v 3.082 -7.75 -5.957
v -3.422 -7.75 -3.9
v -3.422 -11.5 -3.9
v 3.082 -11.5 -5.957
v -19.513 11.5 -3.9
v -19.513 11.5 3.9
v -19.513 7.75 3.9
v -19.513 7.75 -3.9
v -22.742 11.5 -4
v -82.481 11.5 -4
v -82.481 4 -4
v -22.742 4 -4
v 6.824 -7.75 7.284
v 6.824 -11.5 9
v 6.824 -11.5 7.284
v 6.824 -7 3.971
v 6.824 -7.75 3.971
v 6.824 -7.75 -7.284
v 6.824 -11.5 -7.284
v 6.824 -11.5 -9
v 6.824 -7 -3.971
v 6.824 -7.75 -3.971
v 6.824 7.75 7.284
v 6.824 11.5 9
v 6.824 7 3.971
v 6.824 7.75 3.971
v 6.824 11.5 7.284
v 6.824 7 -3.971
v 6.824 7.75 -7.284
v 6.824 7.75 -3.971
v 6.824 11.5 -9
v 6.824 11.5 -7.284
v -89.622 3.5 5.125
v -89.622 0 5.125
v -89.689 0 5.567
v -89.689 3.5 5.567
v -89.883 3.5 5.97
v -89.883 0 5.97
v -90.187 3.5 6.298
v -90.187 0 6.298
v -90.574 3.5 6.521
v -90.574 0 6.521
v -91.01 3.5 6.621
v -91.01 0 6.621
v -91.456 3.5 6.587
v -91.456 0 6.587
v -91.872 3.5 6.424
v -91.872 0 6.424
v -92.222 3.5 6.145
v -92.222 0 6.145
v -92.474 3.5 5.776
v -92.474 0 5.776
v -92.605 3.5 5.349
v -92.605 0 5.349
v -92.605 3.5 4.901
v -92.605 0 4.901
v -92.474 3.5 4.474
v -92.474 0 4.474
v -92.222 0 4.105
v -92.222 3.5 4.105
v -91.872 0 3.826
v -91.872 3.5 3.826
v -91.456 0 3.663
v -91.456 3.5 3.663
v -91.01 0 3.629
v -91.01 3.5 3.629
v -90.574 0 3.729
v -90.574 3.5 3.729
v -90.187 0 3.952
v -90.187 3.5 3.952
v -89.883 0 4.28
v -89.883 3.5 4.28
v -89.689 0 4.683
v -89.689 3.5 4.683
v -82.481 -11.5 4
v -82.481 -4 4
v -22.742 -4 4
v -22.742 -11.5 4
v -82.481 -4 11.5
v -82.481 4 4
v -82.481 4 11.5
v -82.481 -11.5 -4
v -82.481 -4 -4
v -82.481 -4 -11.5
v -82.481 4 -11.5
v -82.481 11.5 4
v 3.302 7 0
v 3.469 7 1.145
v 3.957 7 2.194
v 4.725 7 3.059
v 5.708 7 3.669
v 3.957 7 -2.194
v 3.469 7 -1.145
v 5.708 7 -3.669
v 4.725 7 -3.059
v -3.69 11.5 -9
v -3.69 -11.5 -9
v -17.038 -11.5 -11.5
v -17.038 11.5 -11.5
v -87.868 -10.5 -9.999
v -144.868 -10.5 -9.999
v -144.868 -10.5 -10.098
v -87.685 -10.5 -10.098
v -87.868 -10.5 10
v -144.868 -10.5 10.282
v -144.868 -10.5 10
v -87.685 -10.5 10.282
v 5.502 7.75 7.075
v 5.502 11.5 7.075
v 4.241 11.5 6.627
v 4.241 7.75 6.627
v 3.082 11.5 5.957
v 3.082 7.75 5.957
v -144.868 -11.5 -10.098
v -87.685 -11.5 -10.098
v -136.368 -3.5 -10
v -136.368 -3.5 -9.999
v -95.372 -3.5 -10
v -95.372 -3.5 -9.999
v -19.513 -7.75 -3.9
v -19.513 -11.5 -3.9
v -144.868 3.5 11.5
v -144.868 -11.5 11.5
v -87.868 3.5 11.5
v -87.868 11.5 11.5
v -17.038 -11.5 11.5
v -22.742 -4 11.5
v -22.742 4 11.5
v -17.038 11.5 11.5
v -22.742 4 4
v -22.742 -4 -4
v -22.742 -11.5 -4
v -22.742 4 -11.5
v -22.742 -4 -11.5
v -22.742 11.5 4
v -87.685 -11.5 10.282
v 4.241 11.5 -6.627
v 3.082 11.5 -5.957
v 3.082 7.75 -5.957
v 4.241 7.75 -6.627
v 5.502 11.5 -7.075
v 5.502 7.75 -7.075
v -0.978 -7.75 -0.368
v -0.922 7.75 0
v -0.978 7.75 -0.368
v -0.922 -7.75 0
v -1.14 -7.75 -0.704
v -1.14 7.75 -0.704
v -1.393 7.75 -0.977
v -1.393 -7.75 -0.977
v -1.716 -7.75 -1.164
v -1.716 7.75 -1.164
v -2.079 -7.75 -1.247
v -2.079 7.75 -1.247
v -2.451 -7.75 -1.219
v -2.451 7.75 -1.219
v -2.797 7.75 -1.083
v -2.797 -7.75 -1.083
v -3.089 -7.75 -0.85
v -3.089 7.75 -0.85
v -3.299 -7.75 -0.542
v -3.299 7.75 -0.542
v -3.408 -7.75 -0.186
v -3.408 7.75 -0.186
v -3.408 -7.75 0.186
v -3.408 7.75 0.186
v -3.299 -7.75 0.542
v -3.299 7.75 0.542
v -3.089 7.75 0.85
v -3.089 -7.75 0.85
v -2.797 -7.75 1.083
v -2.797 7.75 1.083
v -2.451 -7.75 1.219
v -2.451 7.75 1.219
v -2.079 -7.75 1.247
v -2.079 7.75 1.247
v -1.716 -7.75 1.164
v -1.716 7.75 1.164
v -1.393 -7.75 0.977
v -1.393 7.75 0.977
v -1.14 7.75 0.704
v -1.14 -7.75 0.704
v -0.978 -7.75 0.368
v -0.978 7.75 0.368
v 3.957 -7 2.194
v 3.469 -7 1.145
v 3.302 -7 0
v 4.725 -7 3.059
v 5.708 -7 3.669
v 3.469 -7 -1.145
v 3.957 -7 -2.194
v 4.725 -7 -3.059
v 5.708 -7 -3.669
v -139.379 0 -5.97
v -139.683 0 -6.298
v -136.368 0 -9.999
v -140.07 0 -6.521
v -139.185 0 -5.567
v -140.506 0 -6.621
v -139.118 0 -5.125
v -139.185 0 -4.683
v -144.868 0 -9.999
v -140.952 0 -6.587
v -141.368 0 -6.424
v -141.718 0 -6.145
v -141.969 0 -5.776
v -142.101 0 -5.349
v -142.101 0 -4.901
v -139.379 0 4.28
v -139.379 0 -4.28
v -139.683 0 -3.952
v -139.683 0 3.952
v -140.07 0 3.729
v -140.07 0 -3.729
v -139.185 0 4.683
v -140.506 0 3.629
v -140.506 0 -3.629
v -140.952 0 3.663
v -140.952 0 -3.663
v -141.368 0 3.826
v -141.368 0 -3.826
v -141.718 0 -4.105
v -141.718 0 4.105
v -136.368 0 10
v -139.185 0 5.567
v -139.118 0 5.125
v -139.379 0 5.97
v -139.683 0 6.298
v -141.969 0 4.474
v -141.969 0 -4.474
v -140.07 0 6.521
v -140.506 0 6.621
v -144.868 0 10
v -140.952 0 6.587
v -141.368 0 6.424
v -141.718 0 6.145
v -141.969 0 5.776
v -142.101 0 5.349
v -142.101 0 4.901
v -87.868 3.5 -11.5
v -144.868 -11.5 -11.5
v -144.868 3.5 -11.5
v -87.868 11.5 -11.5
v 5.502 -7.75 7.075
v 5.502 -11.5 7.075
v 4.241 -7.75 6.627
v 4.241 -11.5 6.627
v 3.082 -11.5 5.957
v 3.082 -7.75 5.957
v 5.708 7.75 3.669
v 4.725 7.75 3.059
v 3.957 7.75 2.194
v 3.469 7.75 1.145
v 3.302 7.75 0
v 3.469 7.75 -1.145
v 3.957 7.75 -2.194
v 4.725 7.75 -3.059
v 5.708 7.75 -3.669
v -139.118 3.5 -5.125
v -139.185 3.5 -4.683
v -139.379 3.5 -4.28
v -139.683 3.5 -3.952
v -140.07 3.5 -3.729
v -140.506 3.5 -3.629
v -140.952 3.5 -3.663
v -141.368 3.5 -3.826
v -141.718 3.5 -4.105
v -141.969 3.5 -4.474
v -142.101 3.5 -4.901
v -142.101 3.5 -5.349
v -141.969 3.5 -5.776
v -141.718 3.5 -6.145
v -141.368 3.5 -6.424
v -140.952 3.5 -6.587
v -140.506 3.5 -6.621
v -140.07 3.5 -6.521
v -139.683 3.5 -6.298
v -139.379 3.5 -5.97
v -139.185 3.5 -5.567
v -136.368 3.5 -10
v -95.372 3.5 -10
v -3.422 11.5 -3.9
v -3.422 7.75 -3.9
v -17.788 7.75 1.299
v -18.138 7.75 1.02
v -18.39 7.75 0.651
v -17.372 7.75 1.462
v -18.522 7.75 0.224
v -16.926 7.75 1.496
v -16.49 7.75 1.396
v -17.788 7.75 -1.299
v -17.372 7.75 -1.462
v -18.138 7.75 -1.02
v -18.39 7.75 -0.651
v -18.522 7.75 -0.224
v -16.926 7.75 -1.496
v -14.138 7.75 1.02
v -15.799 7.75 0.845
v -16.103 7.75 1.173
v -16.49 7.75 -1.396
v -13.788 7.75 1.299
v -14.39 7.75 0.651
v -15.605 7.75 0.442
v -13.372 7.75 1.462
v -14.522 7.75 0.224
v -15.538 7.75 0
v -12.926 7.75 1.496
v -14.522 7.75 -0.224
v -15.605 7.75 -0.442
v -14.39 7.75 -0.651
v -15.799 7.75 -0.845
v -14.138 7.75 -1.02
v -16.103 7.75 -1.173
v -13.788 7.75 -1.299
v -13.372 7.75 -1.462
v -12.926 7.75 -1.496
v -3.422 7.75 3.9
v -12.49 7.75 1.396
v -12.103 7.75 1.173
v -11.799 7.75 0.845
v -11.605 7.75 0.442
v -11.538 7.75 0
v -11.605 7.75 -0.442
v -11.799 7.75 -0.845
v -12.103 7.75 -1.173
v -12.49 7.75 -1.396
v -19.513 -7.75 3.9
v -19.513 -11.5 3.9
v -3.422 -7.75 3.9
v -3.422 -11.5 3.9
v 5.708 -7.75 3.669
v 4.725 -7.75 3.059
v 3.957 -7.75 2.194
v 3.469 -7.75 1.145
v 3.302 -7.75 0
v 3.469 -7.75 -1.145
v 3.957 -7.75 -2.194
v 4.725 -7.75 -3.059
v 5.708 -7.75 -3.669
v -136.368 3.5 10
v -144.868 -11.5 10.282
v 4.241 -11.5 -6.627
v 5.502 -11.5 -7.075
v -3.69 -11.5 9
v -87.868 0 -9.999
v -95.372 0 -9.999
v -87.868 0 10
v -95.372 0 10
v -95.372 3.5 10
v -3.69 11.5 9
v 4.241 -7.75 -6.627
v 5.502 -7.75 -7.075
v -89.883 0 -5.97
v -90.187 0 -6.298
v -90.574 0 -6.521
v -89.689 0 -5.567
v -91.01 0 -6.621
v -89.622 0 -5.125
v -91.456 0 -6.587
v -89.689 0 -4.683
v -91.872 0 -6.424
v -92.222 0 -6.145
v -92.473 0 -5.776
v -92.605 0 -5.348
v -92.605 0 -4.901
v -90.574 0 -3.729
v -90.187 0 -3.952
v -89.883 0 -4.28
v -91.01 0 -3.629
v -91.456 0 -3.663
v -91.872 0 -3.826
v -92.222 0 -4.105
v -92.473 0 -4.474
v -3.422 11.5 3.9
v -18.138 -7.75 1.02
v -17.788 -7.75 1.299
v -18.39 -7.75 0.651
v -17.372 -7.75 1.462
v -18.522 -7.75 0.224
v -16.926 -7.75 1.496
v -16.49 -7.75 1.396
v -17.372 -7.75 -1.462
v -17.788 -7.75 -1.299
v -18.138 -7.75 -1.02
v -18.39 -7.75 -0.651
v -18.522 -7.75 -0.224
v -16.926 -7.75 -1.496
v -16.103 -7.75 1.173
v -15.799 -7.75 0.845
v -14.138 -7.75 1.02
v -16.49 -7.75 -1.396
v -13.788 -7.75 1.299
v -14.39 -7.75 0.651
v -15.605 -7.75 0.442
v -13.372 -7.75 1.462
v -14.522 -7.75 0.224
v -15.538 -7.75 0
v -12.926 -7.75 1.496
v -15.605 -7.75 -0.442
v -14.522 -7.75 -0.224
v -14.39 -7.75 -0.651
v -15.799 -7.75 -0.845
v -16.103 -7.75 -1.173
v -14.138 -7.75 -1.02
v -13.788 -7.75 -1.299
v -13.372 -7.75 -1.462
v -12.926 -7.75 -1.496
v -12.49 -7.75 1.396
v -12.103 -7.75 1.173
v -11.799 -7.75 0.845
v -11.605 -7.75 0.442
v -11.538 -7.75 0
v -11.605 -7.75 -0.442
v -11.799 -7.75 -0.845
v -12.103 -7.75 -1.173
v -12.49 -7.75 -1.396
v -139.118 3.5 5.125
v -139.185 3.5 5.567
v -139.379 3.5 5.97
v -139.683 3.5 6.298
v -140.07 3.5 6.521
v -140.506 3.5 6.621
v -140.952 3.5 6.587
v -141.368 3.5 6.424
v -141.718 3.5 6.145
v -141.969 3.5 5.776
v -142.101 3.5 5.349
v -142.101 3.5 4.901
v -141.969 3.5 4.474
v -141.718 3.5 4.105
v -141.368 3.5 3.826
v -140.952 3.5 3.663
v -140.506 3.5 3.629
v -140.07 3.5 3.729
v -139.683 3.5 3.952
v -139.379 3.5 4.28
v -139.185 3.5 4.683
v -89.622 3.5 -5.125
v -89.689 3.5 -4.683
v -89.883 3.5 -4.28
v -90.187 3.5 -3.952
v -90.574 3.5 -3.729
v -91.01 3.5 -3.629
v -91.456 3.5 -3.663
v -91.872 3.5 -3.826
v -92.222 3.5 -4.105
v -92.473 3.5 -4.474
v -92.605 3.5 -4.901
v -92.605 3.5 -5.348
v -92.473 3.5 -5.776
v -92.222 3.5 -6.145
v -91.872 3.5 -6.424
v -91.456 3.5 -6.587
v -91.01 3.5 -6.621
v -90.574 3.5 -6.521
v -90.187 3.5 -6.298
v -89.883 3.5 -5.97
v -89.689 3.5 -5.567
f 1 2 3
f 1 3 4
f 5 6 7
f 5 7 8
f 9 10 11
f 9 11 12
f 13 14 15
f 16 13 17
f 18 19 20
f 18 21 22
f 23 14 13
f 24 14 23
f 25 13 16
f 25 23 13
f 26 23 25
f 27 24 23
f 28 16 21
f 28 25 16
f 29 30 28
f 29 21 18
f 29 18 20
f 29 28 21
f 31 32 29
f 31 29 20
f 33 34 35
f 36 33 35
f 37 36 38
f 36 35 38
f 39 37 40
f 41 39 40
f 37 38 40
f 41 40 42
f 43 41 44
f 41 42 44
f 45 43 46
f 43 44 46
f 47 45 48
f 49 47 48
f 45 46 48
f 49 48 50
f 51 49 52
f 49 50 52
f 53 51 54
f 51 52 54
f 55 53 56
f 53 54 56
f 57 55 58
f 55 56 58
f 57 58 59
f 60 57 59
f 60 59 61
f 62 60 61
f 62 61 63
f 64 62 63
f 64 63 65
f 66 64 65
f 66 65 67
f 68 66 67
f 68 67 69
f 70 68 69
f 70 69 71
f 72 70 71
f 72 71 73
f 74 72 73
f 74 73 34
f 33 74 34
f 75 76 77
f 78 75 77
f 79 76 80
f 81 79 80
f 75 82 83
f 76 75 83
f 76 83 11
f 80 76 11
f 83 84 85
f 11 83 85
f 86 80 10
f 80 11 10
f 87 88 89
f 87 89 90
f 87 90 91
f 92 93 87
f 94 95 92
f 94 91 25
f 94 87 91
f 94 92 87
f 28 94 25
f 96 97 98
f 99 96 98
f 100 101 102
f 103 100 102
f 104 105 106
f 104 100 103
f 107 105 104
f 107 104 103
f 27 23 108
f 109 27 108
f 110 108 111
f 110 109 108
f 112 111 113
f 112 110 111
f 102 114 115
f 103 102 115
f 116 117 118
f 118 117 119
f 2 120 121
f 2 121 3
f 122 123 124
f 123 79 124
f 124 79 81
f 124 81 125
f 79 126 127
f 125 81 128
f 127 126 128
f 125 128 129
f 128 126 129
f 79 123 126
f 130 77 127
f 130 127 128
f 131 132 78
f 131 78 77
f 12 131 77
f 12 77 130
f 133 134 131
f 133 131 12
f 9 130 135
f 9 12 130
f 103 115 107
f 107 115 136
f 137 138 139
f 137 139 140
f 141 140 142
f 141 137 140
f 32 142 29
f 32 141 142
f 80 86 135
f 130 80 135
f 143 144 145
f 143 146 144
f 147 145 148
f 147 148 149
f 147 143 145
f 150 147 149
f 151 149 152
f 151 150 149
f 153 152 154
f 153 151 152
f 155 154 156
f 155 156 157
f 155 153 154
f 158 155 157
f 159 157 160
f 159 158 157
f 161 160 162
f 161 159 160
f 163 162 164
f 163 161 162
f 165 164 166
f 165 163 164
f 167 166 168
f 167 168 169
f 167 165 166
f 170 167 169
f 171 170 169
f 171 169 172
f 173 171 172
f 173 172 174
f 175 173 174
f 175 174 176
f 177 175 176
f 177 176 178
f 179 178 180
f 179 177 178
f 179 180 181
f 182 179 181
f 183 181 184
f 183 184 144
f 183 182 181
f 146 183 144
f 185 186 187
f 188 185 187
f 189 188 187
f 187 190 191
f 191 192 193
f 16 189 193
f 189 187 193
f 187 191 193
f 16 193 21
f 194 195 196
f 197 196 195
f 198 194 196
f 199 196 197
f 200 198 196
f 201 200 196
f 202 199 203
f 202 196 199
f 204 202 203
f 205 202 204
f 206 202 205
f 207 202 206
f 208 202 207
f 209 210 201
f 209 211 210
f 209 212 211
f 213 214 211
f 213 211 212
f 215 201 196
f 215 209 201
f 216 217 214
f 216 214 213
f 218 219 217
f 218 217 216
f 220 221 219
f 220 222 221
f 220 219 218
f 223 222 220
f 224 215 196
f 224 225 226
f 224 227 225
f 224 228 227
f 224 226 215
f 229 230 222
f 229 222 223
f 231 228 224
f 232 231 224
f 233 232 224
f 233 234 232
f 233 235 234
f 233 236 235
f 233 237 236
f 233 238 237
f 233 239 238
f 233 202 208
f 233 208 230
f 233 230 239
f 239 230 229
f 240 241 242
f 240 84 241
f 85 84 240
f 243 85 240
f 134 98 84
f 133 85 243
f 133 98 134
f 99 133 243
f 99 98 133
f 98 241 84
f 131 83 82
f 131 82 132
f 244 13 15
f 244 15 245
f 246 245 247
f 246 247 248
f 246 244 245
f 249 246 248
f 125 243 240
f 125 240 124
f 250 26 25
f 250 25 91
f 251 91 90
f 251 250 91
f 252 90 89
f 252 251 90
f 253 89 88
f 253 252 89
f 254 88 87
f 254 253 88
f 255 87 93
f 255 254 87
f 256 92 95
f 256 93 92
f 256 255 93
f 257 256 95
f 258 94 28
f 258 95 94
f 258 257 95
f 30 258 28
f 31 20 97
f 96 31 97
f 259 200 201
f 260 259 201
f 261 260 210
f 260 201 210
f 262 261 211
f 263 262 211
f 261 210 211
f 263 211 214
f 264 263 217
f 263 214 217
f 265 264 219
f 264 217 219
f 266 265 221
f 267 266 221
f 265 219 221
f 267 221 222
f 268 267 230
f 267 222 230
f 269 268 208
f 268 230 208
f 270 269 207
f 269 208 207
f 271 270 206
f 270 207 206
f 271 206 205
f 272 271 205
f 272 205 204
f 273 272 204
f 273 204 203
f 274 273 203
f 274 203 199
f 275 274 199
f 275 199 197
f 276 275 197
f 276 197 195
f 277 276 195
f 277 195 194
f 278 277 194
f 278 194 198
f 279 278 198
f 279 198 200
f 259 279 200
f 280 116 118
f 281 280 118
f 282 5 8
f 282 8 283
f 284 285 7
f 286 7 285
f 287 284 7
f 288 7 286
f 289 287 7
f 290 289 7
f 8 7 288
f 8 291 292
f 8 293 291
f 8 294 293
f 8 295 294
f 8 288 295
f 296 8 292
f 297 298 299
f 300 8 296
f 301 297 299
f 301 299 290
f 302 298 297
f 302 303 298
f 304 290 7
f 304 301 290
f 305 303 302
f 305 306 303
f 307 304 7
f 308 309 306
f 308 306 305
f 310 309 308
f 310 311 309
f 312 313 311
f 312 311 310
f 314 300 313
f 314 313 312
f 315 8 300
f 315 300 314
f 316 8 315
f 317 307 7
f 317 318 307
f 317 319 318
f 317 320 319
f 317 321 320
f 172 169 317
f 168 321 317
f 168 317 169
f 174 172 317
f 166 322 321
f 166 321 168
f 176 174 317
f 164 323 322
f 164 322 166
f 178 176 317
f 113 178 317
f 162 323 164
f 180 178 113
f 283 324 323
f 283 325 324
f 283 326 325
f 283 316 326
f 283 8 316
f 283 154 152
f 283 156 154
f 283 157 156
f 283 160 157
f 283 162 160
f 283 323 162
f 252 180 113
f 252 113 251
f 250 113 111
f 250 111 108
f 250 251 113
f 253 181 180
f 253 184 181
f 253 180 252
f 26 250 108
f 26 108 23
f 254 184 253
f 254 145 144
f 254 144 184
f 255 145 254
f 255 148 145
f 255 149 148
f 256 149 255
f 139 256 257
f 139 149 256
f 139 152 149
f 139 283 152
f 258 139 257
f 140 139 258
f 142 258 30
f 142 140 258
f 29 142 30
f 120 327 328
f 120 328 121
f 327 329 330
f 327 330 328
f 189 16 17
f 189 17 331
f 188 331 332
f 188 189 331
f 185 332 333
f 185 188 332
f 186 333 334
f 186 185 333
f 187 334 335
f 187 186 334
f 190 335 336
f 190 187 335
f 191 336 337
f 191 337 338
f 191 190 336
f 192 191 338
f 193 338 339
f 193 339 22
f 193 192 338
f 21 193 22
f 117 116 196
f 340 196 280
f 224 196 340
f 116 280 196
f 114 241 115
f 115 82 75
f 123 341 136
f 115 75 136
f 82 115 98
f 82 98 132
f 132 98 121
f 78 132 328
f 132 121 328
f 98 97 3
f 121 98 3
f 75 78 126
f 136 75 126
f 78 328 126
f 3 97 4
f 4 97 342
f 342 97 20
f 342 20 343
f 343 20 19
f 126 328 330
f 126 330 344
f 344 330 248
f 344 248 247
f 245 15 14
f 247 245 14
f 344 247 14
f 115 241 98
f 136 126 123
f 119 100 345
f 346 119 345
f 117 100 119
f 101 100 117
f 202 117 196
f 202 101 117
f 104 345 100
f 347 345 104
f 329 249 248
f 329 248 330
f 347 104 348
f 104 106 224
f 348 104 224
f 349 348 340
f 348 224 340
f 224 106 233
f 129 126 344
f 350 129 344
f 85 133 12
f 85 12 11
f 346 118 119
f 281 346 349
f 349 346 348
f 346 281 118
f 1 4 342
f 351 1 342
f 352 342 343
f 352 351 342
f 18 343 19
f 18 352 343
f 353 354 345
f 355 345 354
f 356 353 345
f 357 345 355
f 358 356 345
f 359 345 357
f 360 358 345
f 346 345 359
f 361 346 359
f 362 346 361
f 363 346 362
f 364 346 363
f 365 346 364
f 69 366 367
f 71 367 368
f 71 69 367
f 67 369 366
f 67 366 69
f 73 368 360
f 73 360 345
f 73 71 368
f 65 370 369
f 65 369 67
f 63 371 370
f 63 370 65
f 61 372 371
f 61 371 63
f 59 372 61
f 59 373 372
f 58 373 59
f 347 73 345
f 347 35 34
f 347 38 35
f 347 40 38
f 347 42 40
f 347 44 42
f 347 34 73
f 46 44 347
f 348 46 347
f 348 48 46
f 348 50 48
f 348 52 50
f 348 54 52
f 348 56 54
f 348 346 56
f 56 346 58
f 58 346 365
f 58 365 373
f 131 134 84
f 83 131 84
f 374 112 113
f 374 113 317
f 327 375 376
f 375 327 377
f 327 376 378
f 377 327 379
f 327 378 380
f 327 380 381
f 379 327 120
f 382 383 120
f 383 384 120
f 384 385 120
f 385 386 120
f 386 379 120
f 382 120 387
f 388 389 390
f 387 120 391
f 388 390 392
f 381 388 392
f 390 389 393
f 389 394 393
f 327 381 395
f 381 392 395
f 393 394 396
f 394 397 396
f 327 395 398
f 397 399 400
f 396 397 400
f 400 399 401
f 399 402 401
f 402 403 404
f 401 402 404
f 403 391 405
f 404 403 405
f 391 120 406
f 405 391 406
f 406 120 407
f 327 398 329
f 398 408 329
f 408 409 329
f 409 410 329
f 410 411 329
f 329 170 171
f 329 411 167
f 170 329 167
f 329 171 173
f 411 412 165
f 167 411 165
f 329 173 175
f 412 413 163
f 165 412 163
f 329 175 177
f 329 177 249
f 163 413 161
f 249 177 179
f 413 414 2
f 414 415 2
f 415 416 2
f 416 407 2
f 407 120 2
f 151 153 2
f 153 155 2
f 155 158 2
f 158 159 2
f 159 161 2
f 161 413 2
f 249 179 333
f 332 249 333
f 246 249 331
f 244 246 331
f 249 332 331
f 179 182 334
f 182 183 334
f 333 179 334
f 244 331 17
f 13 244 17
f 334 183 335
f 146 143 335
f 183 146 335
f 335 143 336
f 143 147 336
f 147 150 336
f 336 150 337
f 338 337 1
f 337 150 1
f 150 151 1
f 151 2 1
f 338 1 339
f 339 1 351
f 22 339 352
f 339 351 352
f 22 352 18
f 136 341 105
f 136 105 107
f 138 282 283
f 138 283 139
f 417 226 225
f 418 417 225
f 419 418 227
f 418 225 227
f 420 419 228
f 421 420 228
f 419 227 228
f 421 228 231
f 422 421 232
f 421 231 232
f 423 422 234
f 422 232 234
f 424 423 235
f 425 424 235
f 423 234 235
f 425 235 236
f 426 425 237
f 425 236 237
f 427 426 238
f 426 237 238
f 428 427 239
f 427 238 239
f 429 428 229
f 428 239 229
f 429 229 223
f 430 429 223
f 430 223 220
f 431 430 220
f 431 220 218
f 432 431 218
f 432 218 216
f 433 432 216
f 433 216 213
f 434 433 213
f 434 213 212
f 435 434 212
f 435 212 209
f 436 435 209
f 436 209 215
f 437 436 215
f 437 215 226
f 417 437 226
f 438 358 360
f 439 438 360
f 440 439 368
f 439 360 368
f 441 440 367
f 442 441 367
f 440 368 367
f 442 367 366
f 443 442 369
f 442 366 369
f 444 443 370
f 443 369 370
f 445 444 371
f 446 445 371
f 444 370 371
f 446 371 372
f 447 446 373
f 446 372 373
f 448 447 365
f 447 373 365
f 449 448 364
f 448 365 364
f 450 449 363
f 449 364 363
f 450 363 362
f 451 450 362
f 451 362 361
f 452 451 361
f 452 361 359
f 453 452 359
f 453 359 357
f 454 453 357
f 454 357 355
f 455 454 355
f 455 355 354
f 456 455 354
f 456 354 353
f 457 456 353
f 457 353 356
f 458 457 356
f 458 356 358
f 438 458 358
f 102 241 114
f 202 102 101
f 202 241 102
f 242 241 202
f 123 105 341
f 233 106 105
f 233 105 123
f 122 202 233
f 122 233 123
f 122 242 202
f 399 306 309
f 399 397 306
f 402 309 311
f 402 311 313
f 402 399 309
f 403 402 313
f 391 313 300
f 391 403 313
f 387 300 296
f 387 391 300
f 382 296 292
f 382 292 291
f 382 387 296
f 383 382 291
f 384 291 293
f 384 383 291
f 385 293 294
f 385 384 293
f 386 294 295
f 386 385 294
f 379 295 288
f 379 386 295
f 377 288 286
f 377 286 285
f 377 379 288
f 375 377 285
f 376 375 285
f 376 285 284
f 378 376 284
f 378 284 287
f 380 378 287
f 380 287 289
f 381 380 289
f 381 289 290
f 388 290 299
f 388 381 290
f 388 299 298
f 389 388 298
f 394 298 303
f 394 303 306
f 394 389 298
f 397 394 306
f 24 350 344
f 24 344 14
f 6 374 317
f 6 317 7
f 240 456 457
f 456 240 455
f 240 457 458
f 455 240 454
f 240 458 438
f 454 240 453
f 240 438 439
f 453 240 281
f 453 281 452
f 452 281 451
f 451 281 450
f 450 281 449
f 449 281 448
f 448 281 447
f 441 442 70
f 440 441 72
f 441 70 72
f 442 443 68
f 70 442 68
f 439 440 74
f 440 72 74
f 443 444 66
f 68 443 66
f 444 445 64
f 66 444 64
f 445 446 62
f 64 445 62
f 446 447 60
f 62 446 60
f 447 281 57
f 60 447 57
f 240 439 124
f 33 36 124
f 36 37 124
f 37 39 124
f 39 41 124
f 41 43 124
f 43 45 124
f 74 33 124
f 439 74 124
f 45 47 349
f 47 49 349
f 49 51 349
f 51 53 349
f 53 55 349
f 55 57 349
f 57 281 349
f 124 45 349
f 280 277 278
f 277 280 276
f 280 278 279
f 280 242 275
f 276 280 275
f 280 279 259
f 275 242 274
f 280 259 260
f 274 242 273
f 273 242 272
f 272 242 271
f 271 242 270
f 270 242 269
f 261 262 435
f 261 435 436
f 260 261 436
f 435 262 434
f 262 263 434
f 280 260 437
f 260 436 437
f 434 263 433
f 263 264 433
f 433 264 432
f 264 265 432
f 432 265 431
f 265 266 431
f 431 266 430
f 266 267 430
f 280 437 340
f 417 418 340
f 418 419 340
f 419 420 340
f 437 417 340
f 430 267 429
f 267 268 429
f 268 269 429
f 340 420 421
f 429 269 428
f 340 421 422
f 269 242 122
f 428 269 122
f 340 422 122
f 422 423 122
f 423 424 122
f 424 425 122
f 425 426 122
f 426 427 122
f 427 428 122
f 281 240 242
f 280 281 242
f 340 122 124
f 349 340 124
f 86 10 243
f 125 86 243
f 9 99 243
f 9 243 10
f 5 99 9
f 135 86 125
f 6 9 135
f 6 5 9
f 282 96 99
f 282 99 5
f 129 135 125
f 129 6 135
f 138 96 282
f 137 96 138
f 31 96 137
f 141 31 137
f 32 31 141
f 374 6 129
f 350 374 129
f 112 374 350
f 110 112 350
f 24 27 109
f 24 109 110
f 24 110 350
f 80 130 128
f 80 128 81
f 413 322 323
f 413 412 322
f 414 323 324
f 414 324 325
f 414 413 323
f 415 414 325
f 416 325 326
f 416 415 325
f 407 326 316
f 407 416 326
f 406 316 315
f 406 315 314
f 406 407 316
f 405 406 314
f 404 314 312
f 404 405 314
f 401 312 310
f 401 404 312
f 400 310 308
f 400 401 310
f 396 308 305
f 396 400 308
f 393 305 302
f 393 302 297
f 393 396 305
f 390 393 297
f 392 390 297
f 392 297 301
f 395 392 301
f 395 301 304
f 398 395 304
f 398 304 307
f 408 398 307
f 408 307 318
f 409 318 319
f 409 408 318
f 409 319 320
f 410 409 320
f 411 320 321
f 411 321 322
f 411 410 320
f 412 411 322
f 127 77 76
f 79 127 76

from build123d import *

# Parameters (mm, degrees)
BOSS_EXTRUDE1_DEPTH     = 11.5
SKETCH1_13_R            = 1.5
SKETCH1_13_R_2          = 1.25
BOSS_EXTRUDE2_DEPTH     = 7.75
BOSS_EXTRUDE3_DEPTH     = 7
SKETCH2_W               = 23
SKETCH2_H               = 23
BOSS_EXTRUDE4_DEPTH     = 120
CUT_EXTRUDE7_DEPTH      = 5
CUT_EXTRUDE7_DEPTH_BACK = 57
SKETCH9_W               = 19.998553098
SKETCH9_H               = 11.329894336
CUT_EXTRUDE8_START      = -8
SKETCH8_W               = 40.995866108
SKETCH8_H               = 19.999889565
SKETCH8_R               = 1.5
CUT_EXTRUDE8_DEPTH      = 20
SKETCH10_W              = 57.182789297
SKETCH10_H              = 20.379722455
CUT_EXTRUDE9_DEPTH      = 1
SKETCH11_W              = 59.739039785
SKETCH11_H              = 8
CUT_EXTRUDE10_DEPTH     = 40
SKETCH12_W              = 59.739039785
SKETCH12_H              = 8
CUT_EXTRUDE11_DEPTH     = 40
CUT_EXTRUDE12_DEPTH     = 57


with BuildPart() as part:
    # Sketch1 → Boss-Extrude1 (new, symmetric)
    with BuildSketch(Plane(origin=(0, 0, 0), x_dir=(1, 0, 0), z_dir=(0, 1, 0))):
        with BuildLine():
            Line((6.824314586, 7.284360201), (6.824314586, 9.00020274))
            Line((6.824314586, 9.00020274), (-3.690467309, 9.00020274))
            Line((-3.690467309, 9.00020274), (-17.038497557, 11.5))
            Line((-17.038497557, 11.5), (-24.867971487, 11.5))
            Line((-24.867971487, 11.5), (-24.867971487, -11.5))
            Line((-24.867971487, -11.5), (-17.038497557, -11.5))
            Line((-17.038497557, -11.5), (-3.690467309, -9.00020274))
            Line((-3.690467309, -9.00020274), (6.824314586, -9.00020274))
            Line((6.824314586, -9.00020274), (6.824314586, -7.284360201))
            ThreePointArc((6.824314586, -7.284360201), (4.861171432, -6.879883717), (3.082035449, -5.956732906))
            Line((3.082035449, -5.956732906), (-3.422402494, -3.9))
            Line((-3.422402494, -3.9), (-19.513448301, -3.9))
            Line((-19.513448301, -3.9), (-19.513448301, 3.9))
            Line((-19.513448301, 3.9), (-3.422402494, 3.9))
            Line((-3.422402494, 3.9), (3.082035449, 5.956732906))
            ThreePointArc((3.082035449, 5.956732906), (4.861171432, 6.879883717), (6.824314586, 7.284360201))
        make_face()
    extrude(amount=BOSS_EXTRUDE1_DEPTH, both=True)

    # Sketch1<13> → Boss-Extrude2 (add, symmetric)
    with BuildSketch(Plane(origin=(0, 0, 0), x_dir=(1, 0, 0), z_dir=(0, 1, 0))):
        with BuildLine():
            Line((6.824314586, 3.971385595), (6.824314586, 7.284360201))
            ThreePointArc((6.824314586, 7.284360201), (4.861171432, 6.879883717), (3.082035449, 5.956732906))
            Line((3.082035449, 5.956732906), (-3.422402494, 3.9))
            Line((-3.422402494, 3.9), (-19.513448301, 3.9))
            Line((-19.513448301, 3.9), (-19.513448301, -3.9))
            Line((-19.513448301, -3.9), (-3.422402494, -3.9))
            Line((-3.422402494, -3.9), (3.082035449, -5.956732906))
            ThreePointArc((3.082035449, -5.956732906), (4.861171432, -6.879883717), (6.824314586, -7.284360201))
            Line((6.824314586, -7.284360201), (6.824314586, -3.971385595))
            ThreePointArc((6.824314586, -3.971385595), (3.301909035, 0), (6.824314586, 3.971385595))
        make_face()
        with Locations((-17.038497557, 0)):
            Circle(SKETCH1_13_R, mode=Mode.SUBTRACT)
        with Locations((-13.038497557, 0)):
            Circle(SKETCH1_13_R, mode=Mode.SUBTRACT)
        with Locations((-2.172402494, 0)):
            Circle(SKETCH1_13_R_2, mode=Mode.SUBTRACT)
    extrude(amount=BOSS_EXTRUDE2_DEPTH, both=True)

    # Sketch1<14> → Boss-Extrude3 (add, symmetric)
    with BuildSketch(Plane(origin=(0, 0, 0), x_dir=(1, 0, 0), z_dir=(0, 1, 0))):
        with BuildLine():
            Line((6.824314586, -3.971385595), (6.824314586, 3.971385595))
            ThreePointArc((6.824314586, 3.971385595), (3.301909035, 0), (6.824314586, -3.971385595))
        make_face()
    extrude(amount=BOSS_EXTRUDE3_DEPTH, both=True)

    # Sketch2 → Boss-Extrude4 (add)
    with BuildSketch(Plane.ZY.offset(24.867971487)):
        Rectangle(SKETCH2_W, SKETCH2_H)
    extrude(amount=BOSS_EXTRUDE4_DEPTH)

    # Sketch9 → Cut-Extrude7 (cut, two sides: drawn at the far end of the back side and taken through both)
    with BuildSketch(Plane.ZY.offset(144.867971487).offset(-CUT_EXTRUDE7_DEPTH_BACK)):
        with Locations((0.000723451, -5.664947168)):
            Rectangle(SKETCH9_W, SKETCH9_H)
    extrude(amount=CUT_EXTRUDE7_DEPTH + CUT_EXTRUDE7_DEPTH_BACK, mode=Mode.SUBTRACT)

    # Sketch8 → Cut-Extrude8 (cut)
    with BuildSketch(Plane.XZ.offset(11.5).offset(CUT_EXTRUDE8_START)):
        with Locations((-115.870038433, 5.5217e-05)):
            Rectangle(SKETCH8_W, SKETCH8_H)
        with Locations((-140.617971487, 5.125)):
            Circle(SKETCH8_R)
        with Locations((-140.617971487, -5.125)):
            Circle(SKETCH8_R)
        with Locations((-91.122105379, 5.125027608)):
            Circle(SKETCH8_R)
        with Locations((-91.121972212, -5.124917175)):
            Circle(SKETCH8_R)
    extrude(amount=-CUT_EXTRUDE8_DEPTH, mode=Mode.SUBTRACT)

    # Sketch10 → Cut-Extrude9 (cut)
    with BuildSketch(Plane.XZ.offset(11.5)):
        with Locations((-116.276576839, 0.092053876)):
            Rectangle(SKETCH10_W, SKETCH10_H)
    extrude(amount=-CUT_EXTRUDE9_DEPTH, mode=Mode.SUBTRACT)

    # Sketch11 → Cut-Extrude10 (cut)
    with BuildSketch(Plane(origin=(0, 11.5, 0), x_dir=(1, 0, 0), z_dir=(0, 1, 0))):
        with Locations((-52.611089146, 0)):
            Rectangle(SKETCH11_W, SKETCH11_H)
    extrude(amount=-CUT_EXTRUDE10_DEPTH, mode=Mode.SUBTRACT)

    # Sketch12 → Cut-Extrude11 (cut)
    with BuildSketch(Plane(origin=(0, 0, -11.5), x_dir=(-1, 0, 0), z_dir=(0, 0, -1))):
        with Locations((52.611089146, 0)):
            Rectangle(SKETCH12_W, SKETCH12_H)
    extrude(amount=-CUT_EXTRUDE11_DEPTH, mode=Mode.SUBTRACT)

    # Sketch9<12> → Cut-Extrude12 (cut)
    with BuildSketch(Plane.ZY.offset(144.867971487)):
        Polygon((10, 3.5), (11.5, 3.5), (11.5, 3.545517382), (11.5, 11.5), (10, 11.5), (-9.999842993, 11.5), (-11.5, 11.5), (-11.5, 3.5), (-10, 3.5), align=None)
    extrude(amount=-CUT_EXTRUDE12_DEPTH, mode=Mode.SUBTRACT)


solid = part.part
